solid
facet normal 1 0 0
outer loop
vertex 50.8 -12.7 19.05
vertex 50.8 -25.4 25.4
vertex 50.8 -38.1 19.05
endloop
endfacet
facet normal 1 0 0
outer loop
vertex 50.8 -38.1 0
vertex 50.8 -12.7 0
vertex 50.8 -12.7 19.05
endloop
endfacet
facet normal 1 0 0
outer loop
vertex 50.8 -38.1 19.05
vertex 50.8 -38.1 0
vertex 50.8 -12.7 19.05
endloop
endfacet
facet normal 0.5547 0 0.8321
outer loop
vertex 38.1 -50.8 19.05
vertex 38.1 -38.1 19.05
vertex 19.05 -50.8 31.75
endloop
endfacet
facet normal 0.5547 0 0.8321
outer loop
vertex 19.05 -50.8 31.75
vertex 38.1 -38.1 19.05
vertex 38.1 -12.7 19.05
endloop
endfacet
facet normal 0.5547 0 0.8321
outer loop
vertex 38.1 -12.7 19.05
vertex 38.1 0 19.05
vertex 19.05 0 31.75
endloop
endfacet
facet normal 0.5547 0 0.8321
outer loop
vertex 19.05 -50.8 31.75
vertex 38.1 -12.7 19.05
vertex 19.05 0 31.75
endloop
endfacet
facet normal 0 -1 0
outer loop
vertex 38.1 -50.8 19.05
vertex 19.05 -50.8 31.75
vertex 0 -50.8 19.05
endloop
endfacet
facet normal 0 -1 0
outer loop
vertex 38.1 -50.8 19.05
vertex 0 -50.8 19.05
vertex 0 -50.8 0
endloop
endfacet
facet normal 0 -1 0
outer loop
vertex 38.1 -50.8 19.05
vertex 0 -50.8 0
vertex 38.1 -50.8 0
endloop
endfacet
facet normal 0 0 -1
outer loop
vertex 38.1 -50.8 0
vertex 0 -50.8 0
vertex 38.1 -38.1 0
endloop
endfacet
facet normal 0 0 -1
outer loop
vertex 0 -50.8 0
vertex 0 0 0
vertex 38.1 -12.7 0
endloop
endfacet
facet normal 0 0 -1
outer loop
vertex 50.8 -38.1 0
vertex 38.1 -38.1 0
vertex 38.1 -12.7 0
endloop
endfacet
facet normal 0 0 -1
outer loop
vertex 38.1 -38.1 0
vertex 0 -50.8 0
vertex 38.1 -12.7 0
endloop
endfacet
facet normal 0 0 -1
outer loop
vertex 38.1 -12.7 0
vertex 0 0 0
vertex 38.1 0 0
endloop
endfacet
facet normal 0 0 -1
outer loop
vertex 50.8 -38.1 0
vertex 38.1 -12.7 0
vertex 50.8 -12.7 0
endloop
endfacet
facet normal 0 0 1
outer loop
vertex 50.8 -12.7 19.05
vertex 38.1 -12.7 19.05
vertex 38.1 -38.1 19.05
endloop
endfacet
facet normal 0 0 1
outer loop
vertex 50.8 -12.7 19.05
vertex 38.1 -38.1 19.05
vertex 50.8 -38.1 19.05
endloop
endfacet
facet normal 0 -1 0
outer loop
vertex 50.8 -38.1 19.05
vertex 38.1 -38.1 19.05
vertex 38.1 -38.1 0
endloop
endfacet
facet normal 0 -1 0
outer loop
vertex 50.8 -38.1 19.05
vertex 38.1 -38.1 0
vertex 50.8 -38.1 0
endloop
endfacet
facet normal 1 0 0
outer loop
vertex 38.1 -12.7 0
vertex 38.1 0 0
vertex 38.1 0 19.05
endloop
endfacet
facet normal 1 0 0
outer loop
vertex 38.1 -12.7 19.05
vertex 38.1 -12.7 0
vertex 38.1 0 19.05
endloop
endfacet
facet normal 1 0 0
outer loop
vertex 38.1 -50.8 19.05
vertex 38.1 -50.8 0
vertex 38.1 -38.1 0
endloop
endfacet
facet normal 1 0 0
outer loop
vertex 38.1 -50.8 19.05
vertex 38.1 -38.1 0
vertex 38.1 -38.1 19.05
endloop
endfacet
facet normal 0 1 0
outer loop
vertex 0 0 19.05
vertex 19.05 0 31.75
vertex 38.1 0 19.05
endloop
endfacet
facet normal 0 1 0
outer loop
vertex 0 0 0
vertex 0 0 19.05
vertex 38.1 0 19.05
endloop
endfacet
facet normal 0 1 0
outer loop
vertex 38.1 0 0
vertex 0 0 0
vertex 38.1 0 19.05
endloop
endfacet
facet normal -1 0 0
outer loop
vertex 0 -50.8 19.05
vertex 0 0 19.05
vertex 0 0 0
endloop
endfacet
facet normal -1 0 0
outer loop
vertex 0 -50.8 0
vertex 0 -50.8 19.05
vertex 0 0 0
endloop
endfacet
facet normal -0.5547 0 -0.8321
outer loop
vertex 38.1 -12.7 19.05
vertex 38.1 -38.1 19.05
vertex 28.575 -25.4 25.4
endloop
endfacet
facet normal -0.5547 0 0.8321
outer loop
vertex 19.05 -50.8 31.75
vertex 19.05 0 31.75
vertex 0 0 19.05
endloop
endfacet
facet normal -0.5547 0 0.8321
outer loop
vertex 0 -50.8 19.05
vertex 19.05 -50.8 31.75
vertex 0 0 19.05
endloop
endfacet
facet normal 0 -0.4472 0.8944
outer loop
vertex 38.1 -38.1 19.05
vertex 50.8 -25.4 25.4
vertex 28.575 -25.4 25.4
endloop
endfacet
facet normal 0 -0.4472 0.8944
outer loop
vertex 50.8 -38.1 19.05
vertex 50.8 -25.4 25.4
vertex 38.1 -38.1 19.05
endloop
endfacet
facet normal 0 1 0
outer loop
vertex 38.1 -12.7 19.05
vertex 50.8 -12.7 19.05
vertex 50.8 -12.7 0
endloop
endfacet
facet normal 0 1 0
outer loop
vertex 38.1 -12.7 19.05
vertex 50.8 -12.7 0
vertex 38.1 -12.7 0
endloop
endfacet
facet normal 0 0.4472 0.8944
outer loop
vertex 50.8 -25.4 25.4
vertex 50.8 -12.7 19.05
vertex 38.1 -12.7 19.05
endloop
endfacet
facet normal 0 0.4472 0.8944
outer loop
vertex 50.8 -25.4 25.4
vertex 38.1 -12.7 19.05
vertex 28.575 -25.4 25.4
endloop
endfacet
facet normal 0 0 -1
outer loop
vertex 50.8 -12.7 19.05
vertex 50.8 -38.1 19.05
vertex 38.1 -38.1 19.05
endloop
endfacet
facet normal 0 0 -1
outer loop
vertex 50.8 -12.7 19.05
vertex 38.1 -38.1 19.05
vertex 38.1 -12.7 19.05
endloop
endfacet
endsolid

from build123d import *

# Parameters (mm, degrees)
F0_W     = 12.7
F0_H     = 19.05
F1_DEPTH = 50.8
F2_W     = 12.7
F2_H     = 19.05
F3_DEPTH = 12.7
F4_W     = 12.7
F4_H     = 19.05
F5_DEPTH = 12.7


with BuildPart() as f1:
    # F0 (on Front) → F1 (new body)
    with BuildSketch(Plane.XZ):
        Polygon((0, 19.05), (0, 0), (38.1, 0), (38.1, 19.05), (19.05, 31.75), align=None)
        with Locations((44.45, 9.525)):
            Rectangle(F0_W, F0_H)
    extrude(amount=F1_DEPTH)

    # F2 (on face) → F3 (cut)
    with BuildSketch(Plane.XZ.offset(50.8)):
        with Locations((44.45, 9.525)):
            Rectangle(F2_W, F2_H)
    extrude(amount=-F3_DEPTH, mode=Mode.SUBTRACT)

    # F4 (on face) → F5 (cut)
    with BuildSketch(Plane(origin=(0, 0, 0), x_dir=(-1, 0, 0), z_dir=(0, 1, 0))):
        with Locations((-44.45, 9.525)):
            Rectangle(F4_W, F4_H)
    extrude(amount=-F5_DEPTH, mode=Mode.SUBTRACT)


with BuildPart() as f7:
    # F6 (on face) → F7 (new body, up to the next surface of F1)
    with BuildSketch(Plane.YZ.offset(50.8)):
        Polygon((-25.4, 25.4), (-38.1, 19.05), (-12.7, 19.05), align=None)
    extrude(until=Until.NEXT, target=f1.part, dir=(-1, 0, 0))


solid = Compound([f1.part, f7.part])
